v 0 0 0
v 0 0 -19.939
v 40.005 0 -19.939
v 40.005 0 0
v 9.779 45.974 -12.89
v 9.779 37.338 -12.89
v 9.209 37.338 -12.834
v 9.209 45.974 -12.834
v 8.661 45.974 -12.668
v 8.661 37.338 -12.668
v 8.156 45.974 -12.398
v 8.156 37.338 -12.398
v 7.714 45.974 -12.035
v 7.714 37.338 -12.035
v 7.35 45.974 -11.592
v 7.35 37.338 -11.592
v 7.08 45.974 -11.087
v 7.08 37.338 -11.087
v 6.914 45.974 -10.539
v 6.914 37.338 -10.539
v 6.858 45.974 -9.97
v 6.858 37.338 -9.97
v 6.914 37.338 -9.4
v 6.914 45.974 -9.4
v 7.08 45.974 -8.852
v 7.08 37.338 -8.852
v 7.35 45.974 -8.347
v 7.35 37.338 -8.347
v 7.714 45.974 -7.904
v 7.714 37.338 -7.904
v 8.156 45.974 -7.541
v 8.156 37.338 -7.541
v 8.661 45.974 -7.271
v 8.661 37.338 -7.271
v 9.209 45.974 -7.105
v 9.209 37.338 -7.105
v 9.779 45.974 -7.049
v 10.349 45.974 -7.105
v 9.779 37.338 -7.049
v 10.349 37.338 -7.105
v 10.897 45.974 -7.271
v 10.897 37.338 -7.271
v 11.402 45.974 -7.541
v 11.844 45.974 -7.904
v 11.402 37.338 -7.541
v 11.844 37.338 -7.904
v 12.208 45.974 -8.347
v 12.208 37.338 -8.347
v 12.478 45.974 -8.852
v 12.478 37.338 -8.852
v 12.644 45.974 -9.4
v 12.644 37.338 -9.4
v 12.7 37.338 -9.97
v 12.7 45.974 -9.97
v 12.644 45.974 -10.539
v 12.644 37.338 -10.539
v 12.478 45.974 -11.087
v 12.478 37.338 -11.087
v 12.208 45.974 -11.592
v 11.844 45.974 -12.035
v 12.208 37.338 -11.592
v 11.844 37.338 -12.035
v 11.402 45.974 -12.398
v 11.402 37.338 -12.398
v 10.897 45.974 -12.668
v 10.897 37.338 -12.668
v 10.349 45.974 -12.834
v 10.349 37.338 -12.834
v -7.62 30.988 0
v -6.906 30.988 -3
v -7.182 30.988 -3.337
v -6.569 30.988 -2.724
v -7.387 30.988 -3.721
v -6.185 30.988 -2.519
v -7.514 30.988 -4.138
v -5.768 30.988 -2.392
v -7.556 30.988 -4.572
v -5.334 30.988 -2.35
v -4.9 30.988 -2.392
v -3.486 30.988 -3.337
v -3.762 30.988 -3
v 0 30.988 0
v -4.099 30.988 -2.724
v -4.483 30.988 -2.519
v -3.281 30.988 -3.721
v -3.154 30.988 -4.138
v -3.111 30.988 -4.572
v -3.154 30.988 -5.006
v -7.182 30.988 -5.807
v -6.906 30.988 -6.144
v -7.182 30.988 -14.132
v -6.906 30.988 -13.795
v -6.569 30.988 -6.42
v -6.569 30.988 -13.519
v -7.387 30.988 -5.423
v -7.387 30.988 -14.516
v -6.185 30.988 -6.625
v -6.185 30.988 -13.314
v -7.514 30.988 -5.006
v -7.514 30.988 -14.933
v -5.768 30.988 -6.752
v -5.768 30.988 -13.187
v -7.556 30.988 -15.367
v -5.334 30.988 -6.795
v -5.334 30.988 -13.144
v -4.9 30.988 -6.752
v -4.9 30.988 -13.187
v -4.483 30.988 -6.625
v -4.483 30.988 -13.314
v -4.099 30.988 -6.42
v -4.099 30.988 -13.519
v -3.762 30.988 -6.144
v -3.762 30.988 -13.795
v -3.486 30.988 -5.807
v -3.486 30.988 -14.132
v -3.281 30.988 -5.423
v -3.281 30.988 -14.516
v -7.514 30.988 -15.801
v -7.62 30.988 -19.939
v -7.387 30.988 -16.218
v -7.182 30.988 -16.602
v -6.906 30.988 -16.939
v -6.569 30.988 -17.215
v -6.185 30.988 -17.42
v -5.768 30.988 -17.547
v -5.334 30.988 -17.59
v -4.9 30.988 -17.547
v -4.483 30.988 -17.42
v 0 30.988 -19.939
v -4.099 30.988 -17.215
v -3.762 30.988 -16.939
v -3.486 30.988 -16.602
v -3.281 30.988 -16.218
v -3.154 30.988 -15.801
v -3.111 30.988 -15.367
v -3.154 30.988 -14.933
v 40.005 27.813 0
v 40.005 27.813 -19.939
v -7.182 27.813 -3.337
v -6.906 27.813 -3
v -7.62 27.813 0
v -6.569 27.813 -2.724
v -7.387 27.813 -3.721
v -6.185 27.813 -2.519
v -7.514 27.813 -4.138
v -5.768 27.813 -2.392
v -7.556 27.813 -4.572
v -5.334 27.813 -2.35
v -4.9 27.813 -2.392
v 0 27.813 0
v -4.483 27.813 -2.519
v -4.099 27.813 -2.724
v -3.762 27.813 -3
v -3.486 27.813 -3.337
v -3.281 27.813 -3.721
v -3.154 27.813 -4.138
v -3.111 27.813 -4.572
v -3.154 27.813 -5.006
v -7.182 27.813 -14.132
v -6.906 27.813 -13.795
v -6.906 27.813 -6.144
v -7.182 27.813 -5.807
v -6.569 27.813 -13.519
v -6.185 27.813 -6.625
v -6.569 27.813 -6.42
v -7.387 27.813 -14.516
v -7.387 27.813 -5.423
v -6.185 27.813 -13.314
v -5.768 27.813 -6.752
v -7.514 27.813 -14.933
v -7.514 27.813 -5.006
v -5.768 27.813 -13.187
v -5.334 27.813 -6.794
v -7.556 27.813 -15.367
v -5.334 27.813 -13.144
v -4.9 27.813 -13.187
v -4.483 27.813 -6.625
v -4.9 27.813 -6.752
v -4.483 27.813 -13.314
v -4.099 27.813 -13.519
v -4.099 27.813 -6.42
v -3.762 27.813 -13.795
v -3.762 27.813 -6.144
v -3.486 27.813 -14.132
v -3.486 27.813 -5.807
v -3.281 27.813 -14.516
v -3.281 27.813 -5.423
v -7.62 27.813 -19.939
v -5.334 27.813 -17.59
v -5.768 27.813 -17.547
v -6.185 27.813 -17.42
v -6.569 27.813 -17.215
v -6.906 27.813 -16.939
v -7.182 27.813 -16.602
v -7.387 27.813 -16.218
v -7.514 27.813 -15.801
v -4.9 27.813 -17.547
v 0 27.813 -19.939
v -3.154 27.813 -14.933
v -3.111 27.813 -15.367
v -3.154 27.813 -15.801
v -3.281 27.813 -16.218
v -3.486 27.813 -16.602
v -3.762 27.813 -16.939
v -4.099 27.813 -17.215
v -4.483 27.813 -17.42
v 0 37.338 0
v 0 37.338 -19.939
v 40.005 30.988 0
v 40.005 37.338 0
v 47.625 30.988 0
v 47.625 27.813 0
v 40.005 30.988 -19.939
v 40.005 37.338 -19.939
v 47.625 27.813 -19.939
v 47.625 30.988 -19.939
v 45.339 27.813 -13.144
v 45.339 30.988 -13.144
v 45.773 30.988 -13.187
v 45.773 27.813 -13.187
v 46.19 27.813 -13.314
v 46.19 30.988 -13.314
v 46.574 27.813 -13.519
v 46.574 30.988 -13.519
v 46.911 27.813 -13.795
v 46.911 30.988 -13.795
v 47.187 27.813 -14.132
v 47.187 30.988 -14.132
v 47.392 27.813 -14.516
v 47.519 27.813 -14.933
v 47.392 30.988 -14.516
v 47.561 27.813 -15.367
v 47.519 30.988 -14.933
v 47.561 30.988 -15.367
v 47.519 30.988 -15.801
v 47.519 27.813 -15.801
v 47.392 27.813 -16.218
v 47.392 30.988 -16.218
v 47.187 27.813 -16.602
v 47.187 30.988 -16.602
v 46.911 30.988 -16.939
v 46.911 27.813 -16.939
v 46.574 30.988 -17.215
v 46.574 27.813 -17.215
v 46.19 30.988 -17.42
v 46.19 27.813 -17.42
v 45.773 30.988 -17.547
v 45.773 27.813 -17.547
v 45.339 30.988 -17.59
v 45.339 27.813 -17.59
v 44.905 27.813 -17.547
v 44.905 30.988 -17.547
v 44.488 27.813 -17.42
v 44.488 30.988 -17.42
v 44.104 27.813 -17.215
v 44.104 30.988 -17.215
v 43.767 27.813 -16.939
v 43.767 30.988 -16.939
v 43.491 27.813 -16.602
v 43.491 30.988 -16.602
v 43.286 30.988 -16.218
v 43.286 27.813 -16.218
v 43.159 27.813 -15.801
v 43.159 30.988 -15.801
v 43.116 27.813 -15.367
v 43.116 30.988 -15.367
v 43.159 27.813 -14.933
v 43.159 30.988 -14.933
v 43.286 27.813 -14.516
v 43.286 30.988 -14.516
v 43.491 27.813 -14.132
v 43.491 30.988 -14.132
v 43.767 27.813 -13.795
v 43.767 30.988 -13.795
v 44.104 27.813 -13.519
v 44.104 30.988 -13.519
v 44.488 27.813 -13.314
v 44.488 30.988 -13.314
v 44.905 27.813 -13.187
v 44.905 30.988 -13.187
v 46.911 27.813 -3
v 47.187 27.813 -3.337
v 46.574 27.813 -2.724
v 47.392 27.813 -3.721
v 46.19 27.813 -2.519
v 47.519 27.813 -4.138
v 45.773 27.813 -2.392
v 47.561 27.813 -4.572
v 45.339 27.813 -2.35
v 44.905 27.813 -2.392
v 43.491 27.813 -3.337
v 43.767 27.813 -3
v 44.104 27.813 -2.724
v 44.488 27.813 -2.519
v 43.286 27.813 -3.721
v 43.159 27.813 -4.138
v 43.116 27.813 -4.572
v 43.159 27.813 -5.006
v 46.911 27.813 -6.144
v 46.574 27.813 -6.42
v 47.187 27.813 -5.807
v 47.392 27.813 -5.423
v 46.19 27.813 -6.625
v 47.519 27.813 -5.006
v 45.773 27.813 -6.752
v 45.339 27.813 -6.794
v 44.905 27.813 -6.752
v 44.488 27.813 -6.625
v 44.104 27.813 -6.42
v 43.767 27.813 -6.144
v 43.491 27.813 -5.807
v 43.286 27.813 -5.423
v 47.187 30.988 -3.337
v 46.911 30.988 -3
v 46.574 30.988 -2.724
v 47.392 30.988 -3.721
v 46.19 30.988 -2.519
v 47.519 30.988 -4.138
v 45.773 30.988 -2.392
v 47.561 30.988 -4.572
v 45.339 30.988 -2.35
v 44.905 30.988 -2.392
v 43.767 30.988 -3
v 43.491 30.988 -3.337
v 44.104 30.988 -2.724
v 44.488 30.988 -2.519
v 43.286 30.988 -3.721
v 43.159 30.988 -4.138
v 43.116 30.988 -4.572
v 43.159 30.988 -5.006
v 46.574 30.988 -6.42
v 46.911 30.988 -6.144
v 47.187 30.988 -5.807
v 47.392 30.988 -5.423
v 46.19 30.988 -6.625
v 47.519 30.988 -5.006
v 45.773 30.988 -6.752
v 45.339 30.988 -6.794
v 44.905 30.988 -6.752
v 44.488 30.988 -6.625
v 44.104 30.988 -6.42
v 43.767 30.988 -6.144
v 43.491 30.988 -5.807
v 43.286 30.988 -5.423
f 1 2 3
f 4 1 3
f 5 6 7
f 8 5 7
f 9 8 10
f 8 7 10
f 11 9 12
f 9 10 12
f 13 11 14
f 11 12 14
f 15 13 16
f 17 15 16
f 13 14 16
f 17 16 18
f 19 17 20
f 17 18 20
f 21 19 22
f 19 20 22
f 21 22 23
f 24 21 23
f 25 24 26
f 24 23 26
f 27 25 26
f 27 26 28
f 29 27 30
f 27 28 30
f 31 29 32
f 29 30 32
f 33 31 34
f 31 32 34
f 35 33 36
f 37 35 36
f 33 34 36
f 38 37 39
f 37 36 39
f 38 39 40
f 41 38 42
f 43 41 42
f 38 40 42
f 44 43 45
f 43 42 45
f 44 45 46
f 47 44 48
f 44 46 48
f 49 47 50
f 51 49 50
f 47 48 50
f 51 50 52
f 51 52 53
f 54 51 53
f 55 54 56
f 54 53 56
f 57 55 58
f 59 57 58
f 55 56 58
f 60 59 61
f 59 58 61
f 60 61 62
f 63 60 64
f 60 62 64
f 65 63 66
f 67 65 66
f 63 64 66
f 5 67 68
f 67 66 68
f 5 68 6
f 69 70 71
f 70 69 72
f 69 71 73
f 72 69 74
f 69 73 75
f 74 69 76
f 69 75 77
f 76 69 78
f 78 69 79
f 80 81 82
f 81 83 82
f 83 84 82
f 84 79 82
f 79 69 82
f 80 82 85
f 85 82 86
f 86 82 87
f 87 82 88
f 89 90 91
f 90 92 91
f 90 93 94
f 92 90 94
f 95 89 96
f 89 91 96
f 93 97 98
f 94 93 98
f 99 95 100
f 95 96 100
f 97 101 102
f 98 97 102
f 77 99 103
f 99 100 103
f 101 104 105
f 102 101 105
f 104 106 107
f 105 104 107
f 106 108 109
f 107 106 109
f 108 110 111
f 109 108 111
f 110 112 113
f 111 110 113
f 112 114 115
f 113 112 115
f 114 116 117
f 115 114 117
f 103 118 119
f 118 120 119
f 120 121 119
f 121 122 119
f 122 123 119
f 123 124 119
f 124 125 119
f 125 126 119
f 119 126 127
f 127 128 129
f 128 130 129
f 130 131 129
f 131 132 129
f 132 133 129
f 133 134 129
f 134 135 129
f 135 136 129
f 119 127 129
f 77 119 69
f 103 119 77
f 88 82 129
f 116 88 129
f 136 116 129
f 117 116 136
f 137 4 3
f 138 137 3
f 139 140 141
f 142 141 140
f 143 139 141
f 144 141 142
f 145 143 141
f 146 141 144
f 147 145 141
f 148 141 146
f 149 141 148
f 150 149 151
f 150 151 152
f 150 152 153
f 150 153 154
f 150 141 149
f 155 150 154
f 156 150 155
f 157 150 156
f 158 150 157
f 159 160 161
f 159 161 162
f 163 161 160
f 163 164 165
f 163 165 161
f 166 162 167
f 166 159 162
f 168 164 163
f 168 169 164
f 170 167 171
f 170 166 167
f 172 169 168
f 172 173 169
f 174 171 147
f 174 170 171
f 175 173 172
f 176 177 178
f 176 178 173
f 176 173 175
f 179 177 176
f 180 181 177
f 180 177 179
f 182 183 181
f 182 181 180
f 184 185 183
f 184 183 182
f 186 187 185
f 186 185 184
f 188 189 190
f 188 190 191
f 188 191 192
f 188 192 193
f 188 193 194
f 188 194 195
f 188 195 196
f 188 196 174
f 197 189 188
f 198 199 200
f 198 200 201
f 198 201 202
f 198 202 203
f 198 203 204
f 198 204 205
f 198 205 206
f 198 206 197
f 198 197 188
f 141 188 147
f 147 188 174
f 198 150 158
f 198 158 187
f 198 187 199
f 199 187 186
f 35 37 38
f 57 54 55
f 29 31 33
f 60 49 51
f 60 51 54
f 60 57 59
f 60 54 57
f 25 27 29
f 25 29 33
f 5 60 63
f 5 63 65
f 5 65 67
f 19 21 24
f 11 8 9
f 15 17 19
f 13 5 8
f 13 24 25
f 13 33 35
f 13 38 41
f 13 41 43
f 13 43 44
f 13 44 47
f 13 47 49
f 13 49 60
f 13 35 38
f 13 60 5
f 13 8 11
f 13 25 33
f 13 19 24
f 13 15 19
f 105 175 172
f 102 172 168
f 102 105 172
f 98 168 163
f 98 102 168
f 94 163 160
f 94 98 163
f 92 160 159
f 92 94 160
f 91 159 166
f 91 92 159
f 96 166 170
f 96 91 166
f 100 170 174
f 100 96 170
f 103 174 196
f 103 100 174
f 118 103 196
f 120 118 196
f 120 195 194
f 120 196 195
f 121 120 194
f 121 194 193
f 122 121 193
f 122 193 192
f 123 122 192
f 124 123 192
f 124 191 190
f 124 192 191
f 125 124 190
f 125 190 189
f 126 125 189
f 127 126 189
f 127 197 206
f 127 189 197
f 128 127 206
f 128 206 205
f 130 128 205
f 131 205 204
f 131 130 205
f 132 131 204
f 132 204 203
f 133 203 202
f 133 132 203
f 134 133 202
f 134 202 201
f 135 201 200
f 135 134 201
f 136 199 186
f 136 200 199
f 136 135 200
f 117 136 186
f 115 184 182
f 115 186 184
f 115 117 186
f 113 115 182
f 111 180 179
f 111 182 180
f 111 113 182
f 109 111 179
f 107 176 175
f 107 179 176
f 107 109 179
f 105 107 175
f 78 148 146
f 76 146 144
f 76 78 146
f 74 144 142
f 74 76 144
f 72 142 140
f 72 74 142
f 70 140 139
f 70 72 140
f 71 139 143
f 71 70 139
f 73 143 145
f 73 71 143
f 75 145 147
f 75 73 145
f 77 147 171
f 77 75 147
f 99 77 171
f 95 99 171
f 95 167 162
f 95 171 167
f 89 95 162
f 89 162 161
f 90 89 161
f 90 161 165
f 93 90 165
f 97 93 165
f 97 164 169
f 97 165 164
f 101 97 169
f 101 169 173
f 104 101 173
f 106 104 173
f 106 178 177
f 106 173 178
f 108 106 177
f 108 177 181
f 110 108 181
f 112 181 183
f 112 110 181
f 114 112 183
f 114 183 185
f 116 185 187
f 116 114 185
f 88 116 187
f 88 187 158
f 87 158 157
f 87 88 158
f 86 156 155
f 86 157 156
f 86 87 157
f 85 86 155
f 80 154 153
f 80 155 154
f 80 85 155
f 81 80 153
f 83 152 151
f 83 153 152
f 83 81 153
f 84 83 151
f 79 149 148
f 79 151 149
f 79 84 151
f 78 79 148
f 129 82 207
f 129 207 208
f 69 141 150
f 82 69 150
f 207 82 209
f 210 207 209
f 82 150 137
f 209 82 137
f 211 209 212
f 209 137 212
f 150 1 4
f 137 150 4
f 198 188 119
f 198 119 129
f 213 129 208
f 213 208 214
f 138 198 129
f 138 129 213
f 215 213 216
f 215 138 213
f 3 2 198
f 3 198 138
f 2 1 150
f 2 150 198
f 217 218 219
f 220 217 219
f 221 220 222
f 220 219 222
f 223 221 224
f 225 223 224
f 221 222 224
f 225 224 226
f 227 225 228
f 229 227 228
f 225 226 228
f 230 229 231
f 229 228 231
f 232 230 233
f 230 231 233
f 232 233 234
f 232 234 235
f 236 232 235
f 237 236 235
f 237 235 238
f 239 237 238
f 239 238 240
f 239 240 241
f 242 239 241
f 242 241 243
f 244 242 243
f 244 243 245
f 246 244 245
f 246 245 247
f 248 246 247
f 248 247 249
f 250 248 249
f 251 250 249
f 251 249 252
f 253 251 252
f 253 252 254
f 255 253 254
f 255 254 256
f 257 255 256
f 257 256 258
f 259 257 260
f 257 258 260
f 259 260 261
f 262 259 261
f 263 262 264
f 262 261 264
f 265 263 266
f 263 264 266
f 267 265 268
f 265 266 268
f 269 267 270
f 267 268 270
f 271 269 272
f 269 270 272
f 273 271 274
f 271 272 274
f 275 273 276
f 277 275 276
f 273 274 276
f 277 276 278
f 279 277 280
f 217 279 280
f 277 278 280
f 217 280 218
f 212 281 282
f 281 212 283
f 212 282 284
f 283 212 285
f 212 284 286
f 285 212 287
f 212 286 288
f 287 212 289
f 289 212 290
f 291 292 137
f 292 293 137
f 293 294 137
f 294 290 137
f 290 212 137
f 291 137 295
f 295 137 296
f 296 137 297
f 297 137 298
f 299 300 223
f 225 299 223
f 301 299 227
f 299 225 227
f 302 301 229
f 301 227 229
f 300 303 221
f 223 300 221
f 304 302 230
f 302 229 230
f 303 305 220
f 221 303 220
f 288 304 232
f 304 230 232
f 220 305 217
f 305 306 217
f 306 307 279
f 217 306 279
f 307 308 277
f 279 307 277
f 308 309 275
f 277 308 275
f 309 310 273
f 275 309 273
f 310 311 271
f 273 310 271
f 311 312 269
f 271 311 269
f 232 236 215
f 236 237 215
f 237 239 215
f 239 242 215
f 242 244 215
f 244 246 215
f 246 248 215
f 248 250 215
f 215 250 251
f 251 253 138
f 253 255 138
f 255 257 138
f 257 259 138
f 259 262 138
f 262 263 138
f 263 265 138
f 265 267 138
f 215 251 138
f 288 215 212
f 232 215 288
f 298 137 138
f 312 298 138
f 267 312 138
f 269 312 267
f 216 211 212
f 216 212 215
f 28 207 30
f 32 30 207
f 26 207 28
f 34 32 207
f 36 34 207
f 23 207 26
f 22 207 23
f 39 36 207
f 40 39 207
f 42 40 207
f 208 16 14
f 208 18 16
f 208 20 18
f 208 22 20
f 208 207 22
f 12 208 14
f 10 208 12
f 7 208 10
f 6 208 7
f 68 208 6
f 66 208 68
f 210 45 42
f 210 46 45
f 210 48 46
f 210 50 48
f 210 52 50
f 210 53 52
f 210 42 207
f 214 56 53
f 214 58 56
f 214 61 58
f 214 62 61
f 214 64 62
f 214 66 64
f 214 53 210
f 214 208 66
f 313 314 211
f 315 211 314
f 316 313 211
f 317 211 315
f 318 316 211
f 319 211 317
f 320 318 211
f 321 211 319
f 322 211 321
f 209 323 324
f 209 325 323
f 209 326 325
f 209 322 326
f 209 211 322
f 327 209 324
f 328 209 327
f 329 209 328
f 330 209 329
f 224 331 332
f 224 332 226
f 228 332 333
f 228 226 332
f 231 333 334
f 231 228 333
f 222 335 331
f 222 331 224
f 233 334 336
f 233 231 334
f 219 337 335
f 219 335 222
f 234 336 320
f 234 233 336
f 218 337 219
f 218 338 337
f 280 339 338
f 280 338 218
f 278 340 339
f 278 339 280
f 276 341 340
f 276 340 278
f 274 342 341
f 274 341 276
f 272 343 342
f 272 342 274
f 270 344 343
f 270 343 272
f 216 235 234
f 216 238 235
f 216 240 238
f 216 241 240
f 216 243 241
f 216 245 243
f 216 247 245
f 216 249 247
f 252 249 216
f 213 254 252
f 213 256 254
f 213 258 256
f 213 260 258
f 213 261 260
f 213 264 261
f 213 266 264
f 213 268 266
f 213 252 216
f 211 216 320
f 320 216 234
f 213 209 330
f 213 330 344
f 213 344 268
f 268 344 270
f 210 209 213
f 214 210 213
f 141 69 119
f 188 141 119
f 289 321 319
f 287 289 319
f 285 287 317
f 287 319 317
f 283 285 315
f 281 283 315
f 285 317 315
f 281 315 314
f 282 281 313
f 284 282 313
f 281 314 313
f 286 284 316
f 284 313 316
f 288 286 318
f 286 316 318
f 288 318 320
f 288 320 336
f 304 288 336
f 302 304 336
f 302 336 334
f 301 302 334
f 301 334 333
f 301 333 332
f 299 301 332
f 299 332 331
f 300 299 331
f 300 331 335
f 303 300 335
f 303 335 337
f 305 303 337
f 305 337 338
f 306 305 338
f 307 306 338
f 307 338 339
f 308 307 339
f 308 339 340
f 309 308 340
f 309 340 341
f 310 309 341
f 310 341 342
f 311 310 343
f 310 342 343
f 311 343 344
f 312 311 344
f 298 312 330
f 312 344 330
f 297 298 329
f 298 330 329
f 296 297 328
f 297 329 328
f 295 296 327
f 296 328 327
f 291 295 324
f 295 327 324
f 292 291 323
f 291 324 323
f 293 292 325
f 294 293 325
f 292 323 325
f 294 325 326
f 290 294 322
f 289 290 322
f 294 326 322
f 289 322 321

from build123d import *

# Parameters (mm, degrees)
SKETCH1_W           = 40.005
SKETCH1_H           = 19.939
BOSS_EXTRUDE1_DEPTH = 37.338
SKETCH2_W           = 19.939
SKETCH2_H           = 3.175
BOSS_EXTRUDE2_DEPTH = 7.62
SKETCH3_R           = 2.2225
CUT_EXTRUDE1_DEPTH  = 61.215948801
SKETCH4_R           = 2.921
BOSS_EXTRUDE3_DEPTH = 8.636


with BuildPart() as part:
    # Sketch1 → Boss-Extrude1 (new body)
    with BuildSketch(Plane(origin=(0, 0, 0), x_dir=(1, 0, 0), z_dir=(0, 1, 0))):
        with Locations((20.0025, 9.9695)):
            Rectangle(SKETCH1_W, SKETCH1_H)
    extrude(amount=BOSS_EXTRUDE1_DEPTH)

    # Sketch2 → Boss-Extrude2 (add)
    with BuildSketch(Plane(origin=(40.005, 0, 0), x_dir=(0, 0, -1), z_dir=(1, 0, 0))):
        with Locations((9.9695, 29.4005)):
            Rectangle(SKETCH2_W, SKETCH2_H)
    boss_extrude2 = extrude(amount=BOSS_EXTRUDE2_DEPTH)

    # Sketch3 → Cut-Extrude1 (cut, through all)
    with BuildSketch(Plane(origin=(0, 30.988, 0), x_dir=(1, 0, 0), z_dir=(0, 1, 0))):
        with Locations(Location((45.339, 15.367, 0), (0, 0, 270))):
            Circle(SKETCH3_R)
        with Locations(Location((45.339, 4.572, 0), (0, 0, 270))):
            Circle(SKETCH3_R)
    cut_extrude1 = extrude(amount=-CUT_EXTRUDE1_DEPTH, mode=Mode.SUBTRACT)

    # Mirror1: Boss-Extrude2, Cut-Extrude1 across plane
    add(boss_extrude2.mirror(Plane(origin=(20.0025, 0, 0), x_dir=(0, 0, 1), z_dir=(1, 0, 0))))
    add(cut_extrude1.mirror(Plane(origin=(20.0025, 0, 0), x_dir=(0, 0, 1), z_dir=(1, 0, 0))), mode=Mode.SUBTRACT)

    # Sketch4 → Boss-Extrude3 (add)
    with BuildSketch(Plane(origin=(0, 37.338, 0), x_dir=(1, 0, 0), z_dir=(0, 1, 0))):
        with Locations(Location((9.779, 9.9695, 0), (0, 0, 90))):
            Circle(SKETCH4_R)
    extrude(amount=BOSS_EXTRUDE3_DEPTH)


solid = part.part
